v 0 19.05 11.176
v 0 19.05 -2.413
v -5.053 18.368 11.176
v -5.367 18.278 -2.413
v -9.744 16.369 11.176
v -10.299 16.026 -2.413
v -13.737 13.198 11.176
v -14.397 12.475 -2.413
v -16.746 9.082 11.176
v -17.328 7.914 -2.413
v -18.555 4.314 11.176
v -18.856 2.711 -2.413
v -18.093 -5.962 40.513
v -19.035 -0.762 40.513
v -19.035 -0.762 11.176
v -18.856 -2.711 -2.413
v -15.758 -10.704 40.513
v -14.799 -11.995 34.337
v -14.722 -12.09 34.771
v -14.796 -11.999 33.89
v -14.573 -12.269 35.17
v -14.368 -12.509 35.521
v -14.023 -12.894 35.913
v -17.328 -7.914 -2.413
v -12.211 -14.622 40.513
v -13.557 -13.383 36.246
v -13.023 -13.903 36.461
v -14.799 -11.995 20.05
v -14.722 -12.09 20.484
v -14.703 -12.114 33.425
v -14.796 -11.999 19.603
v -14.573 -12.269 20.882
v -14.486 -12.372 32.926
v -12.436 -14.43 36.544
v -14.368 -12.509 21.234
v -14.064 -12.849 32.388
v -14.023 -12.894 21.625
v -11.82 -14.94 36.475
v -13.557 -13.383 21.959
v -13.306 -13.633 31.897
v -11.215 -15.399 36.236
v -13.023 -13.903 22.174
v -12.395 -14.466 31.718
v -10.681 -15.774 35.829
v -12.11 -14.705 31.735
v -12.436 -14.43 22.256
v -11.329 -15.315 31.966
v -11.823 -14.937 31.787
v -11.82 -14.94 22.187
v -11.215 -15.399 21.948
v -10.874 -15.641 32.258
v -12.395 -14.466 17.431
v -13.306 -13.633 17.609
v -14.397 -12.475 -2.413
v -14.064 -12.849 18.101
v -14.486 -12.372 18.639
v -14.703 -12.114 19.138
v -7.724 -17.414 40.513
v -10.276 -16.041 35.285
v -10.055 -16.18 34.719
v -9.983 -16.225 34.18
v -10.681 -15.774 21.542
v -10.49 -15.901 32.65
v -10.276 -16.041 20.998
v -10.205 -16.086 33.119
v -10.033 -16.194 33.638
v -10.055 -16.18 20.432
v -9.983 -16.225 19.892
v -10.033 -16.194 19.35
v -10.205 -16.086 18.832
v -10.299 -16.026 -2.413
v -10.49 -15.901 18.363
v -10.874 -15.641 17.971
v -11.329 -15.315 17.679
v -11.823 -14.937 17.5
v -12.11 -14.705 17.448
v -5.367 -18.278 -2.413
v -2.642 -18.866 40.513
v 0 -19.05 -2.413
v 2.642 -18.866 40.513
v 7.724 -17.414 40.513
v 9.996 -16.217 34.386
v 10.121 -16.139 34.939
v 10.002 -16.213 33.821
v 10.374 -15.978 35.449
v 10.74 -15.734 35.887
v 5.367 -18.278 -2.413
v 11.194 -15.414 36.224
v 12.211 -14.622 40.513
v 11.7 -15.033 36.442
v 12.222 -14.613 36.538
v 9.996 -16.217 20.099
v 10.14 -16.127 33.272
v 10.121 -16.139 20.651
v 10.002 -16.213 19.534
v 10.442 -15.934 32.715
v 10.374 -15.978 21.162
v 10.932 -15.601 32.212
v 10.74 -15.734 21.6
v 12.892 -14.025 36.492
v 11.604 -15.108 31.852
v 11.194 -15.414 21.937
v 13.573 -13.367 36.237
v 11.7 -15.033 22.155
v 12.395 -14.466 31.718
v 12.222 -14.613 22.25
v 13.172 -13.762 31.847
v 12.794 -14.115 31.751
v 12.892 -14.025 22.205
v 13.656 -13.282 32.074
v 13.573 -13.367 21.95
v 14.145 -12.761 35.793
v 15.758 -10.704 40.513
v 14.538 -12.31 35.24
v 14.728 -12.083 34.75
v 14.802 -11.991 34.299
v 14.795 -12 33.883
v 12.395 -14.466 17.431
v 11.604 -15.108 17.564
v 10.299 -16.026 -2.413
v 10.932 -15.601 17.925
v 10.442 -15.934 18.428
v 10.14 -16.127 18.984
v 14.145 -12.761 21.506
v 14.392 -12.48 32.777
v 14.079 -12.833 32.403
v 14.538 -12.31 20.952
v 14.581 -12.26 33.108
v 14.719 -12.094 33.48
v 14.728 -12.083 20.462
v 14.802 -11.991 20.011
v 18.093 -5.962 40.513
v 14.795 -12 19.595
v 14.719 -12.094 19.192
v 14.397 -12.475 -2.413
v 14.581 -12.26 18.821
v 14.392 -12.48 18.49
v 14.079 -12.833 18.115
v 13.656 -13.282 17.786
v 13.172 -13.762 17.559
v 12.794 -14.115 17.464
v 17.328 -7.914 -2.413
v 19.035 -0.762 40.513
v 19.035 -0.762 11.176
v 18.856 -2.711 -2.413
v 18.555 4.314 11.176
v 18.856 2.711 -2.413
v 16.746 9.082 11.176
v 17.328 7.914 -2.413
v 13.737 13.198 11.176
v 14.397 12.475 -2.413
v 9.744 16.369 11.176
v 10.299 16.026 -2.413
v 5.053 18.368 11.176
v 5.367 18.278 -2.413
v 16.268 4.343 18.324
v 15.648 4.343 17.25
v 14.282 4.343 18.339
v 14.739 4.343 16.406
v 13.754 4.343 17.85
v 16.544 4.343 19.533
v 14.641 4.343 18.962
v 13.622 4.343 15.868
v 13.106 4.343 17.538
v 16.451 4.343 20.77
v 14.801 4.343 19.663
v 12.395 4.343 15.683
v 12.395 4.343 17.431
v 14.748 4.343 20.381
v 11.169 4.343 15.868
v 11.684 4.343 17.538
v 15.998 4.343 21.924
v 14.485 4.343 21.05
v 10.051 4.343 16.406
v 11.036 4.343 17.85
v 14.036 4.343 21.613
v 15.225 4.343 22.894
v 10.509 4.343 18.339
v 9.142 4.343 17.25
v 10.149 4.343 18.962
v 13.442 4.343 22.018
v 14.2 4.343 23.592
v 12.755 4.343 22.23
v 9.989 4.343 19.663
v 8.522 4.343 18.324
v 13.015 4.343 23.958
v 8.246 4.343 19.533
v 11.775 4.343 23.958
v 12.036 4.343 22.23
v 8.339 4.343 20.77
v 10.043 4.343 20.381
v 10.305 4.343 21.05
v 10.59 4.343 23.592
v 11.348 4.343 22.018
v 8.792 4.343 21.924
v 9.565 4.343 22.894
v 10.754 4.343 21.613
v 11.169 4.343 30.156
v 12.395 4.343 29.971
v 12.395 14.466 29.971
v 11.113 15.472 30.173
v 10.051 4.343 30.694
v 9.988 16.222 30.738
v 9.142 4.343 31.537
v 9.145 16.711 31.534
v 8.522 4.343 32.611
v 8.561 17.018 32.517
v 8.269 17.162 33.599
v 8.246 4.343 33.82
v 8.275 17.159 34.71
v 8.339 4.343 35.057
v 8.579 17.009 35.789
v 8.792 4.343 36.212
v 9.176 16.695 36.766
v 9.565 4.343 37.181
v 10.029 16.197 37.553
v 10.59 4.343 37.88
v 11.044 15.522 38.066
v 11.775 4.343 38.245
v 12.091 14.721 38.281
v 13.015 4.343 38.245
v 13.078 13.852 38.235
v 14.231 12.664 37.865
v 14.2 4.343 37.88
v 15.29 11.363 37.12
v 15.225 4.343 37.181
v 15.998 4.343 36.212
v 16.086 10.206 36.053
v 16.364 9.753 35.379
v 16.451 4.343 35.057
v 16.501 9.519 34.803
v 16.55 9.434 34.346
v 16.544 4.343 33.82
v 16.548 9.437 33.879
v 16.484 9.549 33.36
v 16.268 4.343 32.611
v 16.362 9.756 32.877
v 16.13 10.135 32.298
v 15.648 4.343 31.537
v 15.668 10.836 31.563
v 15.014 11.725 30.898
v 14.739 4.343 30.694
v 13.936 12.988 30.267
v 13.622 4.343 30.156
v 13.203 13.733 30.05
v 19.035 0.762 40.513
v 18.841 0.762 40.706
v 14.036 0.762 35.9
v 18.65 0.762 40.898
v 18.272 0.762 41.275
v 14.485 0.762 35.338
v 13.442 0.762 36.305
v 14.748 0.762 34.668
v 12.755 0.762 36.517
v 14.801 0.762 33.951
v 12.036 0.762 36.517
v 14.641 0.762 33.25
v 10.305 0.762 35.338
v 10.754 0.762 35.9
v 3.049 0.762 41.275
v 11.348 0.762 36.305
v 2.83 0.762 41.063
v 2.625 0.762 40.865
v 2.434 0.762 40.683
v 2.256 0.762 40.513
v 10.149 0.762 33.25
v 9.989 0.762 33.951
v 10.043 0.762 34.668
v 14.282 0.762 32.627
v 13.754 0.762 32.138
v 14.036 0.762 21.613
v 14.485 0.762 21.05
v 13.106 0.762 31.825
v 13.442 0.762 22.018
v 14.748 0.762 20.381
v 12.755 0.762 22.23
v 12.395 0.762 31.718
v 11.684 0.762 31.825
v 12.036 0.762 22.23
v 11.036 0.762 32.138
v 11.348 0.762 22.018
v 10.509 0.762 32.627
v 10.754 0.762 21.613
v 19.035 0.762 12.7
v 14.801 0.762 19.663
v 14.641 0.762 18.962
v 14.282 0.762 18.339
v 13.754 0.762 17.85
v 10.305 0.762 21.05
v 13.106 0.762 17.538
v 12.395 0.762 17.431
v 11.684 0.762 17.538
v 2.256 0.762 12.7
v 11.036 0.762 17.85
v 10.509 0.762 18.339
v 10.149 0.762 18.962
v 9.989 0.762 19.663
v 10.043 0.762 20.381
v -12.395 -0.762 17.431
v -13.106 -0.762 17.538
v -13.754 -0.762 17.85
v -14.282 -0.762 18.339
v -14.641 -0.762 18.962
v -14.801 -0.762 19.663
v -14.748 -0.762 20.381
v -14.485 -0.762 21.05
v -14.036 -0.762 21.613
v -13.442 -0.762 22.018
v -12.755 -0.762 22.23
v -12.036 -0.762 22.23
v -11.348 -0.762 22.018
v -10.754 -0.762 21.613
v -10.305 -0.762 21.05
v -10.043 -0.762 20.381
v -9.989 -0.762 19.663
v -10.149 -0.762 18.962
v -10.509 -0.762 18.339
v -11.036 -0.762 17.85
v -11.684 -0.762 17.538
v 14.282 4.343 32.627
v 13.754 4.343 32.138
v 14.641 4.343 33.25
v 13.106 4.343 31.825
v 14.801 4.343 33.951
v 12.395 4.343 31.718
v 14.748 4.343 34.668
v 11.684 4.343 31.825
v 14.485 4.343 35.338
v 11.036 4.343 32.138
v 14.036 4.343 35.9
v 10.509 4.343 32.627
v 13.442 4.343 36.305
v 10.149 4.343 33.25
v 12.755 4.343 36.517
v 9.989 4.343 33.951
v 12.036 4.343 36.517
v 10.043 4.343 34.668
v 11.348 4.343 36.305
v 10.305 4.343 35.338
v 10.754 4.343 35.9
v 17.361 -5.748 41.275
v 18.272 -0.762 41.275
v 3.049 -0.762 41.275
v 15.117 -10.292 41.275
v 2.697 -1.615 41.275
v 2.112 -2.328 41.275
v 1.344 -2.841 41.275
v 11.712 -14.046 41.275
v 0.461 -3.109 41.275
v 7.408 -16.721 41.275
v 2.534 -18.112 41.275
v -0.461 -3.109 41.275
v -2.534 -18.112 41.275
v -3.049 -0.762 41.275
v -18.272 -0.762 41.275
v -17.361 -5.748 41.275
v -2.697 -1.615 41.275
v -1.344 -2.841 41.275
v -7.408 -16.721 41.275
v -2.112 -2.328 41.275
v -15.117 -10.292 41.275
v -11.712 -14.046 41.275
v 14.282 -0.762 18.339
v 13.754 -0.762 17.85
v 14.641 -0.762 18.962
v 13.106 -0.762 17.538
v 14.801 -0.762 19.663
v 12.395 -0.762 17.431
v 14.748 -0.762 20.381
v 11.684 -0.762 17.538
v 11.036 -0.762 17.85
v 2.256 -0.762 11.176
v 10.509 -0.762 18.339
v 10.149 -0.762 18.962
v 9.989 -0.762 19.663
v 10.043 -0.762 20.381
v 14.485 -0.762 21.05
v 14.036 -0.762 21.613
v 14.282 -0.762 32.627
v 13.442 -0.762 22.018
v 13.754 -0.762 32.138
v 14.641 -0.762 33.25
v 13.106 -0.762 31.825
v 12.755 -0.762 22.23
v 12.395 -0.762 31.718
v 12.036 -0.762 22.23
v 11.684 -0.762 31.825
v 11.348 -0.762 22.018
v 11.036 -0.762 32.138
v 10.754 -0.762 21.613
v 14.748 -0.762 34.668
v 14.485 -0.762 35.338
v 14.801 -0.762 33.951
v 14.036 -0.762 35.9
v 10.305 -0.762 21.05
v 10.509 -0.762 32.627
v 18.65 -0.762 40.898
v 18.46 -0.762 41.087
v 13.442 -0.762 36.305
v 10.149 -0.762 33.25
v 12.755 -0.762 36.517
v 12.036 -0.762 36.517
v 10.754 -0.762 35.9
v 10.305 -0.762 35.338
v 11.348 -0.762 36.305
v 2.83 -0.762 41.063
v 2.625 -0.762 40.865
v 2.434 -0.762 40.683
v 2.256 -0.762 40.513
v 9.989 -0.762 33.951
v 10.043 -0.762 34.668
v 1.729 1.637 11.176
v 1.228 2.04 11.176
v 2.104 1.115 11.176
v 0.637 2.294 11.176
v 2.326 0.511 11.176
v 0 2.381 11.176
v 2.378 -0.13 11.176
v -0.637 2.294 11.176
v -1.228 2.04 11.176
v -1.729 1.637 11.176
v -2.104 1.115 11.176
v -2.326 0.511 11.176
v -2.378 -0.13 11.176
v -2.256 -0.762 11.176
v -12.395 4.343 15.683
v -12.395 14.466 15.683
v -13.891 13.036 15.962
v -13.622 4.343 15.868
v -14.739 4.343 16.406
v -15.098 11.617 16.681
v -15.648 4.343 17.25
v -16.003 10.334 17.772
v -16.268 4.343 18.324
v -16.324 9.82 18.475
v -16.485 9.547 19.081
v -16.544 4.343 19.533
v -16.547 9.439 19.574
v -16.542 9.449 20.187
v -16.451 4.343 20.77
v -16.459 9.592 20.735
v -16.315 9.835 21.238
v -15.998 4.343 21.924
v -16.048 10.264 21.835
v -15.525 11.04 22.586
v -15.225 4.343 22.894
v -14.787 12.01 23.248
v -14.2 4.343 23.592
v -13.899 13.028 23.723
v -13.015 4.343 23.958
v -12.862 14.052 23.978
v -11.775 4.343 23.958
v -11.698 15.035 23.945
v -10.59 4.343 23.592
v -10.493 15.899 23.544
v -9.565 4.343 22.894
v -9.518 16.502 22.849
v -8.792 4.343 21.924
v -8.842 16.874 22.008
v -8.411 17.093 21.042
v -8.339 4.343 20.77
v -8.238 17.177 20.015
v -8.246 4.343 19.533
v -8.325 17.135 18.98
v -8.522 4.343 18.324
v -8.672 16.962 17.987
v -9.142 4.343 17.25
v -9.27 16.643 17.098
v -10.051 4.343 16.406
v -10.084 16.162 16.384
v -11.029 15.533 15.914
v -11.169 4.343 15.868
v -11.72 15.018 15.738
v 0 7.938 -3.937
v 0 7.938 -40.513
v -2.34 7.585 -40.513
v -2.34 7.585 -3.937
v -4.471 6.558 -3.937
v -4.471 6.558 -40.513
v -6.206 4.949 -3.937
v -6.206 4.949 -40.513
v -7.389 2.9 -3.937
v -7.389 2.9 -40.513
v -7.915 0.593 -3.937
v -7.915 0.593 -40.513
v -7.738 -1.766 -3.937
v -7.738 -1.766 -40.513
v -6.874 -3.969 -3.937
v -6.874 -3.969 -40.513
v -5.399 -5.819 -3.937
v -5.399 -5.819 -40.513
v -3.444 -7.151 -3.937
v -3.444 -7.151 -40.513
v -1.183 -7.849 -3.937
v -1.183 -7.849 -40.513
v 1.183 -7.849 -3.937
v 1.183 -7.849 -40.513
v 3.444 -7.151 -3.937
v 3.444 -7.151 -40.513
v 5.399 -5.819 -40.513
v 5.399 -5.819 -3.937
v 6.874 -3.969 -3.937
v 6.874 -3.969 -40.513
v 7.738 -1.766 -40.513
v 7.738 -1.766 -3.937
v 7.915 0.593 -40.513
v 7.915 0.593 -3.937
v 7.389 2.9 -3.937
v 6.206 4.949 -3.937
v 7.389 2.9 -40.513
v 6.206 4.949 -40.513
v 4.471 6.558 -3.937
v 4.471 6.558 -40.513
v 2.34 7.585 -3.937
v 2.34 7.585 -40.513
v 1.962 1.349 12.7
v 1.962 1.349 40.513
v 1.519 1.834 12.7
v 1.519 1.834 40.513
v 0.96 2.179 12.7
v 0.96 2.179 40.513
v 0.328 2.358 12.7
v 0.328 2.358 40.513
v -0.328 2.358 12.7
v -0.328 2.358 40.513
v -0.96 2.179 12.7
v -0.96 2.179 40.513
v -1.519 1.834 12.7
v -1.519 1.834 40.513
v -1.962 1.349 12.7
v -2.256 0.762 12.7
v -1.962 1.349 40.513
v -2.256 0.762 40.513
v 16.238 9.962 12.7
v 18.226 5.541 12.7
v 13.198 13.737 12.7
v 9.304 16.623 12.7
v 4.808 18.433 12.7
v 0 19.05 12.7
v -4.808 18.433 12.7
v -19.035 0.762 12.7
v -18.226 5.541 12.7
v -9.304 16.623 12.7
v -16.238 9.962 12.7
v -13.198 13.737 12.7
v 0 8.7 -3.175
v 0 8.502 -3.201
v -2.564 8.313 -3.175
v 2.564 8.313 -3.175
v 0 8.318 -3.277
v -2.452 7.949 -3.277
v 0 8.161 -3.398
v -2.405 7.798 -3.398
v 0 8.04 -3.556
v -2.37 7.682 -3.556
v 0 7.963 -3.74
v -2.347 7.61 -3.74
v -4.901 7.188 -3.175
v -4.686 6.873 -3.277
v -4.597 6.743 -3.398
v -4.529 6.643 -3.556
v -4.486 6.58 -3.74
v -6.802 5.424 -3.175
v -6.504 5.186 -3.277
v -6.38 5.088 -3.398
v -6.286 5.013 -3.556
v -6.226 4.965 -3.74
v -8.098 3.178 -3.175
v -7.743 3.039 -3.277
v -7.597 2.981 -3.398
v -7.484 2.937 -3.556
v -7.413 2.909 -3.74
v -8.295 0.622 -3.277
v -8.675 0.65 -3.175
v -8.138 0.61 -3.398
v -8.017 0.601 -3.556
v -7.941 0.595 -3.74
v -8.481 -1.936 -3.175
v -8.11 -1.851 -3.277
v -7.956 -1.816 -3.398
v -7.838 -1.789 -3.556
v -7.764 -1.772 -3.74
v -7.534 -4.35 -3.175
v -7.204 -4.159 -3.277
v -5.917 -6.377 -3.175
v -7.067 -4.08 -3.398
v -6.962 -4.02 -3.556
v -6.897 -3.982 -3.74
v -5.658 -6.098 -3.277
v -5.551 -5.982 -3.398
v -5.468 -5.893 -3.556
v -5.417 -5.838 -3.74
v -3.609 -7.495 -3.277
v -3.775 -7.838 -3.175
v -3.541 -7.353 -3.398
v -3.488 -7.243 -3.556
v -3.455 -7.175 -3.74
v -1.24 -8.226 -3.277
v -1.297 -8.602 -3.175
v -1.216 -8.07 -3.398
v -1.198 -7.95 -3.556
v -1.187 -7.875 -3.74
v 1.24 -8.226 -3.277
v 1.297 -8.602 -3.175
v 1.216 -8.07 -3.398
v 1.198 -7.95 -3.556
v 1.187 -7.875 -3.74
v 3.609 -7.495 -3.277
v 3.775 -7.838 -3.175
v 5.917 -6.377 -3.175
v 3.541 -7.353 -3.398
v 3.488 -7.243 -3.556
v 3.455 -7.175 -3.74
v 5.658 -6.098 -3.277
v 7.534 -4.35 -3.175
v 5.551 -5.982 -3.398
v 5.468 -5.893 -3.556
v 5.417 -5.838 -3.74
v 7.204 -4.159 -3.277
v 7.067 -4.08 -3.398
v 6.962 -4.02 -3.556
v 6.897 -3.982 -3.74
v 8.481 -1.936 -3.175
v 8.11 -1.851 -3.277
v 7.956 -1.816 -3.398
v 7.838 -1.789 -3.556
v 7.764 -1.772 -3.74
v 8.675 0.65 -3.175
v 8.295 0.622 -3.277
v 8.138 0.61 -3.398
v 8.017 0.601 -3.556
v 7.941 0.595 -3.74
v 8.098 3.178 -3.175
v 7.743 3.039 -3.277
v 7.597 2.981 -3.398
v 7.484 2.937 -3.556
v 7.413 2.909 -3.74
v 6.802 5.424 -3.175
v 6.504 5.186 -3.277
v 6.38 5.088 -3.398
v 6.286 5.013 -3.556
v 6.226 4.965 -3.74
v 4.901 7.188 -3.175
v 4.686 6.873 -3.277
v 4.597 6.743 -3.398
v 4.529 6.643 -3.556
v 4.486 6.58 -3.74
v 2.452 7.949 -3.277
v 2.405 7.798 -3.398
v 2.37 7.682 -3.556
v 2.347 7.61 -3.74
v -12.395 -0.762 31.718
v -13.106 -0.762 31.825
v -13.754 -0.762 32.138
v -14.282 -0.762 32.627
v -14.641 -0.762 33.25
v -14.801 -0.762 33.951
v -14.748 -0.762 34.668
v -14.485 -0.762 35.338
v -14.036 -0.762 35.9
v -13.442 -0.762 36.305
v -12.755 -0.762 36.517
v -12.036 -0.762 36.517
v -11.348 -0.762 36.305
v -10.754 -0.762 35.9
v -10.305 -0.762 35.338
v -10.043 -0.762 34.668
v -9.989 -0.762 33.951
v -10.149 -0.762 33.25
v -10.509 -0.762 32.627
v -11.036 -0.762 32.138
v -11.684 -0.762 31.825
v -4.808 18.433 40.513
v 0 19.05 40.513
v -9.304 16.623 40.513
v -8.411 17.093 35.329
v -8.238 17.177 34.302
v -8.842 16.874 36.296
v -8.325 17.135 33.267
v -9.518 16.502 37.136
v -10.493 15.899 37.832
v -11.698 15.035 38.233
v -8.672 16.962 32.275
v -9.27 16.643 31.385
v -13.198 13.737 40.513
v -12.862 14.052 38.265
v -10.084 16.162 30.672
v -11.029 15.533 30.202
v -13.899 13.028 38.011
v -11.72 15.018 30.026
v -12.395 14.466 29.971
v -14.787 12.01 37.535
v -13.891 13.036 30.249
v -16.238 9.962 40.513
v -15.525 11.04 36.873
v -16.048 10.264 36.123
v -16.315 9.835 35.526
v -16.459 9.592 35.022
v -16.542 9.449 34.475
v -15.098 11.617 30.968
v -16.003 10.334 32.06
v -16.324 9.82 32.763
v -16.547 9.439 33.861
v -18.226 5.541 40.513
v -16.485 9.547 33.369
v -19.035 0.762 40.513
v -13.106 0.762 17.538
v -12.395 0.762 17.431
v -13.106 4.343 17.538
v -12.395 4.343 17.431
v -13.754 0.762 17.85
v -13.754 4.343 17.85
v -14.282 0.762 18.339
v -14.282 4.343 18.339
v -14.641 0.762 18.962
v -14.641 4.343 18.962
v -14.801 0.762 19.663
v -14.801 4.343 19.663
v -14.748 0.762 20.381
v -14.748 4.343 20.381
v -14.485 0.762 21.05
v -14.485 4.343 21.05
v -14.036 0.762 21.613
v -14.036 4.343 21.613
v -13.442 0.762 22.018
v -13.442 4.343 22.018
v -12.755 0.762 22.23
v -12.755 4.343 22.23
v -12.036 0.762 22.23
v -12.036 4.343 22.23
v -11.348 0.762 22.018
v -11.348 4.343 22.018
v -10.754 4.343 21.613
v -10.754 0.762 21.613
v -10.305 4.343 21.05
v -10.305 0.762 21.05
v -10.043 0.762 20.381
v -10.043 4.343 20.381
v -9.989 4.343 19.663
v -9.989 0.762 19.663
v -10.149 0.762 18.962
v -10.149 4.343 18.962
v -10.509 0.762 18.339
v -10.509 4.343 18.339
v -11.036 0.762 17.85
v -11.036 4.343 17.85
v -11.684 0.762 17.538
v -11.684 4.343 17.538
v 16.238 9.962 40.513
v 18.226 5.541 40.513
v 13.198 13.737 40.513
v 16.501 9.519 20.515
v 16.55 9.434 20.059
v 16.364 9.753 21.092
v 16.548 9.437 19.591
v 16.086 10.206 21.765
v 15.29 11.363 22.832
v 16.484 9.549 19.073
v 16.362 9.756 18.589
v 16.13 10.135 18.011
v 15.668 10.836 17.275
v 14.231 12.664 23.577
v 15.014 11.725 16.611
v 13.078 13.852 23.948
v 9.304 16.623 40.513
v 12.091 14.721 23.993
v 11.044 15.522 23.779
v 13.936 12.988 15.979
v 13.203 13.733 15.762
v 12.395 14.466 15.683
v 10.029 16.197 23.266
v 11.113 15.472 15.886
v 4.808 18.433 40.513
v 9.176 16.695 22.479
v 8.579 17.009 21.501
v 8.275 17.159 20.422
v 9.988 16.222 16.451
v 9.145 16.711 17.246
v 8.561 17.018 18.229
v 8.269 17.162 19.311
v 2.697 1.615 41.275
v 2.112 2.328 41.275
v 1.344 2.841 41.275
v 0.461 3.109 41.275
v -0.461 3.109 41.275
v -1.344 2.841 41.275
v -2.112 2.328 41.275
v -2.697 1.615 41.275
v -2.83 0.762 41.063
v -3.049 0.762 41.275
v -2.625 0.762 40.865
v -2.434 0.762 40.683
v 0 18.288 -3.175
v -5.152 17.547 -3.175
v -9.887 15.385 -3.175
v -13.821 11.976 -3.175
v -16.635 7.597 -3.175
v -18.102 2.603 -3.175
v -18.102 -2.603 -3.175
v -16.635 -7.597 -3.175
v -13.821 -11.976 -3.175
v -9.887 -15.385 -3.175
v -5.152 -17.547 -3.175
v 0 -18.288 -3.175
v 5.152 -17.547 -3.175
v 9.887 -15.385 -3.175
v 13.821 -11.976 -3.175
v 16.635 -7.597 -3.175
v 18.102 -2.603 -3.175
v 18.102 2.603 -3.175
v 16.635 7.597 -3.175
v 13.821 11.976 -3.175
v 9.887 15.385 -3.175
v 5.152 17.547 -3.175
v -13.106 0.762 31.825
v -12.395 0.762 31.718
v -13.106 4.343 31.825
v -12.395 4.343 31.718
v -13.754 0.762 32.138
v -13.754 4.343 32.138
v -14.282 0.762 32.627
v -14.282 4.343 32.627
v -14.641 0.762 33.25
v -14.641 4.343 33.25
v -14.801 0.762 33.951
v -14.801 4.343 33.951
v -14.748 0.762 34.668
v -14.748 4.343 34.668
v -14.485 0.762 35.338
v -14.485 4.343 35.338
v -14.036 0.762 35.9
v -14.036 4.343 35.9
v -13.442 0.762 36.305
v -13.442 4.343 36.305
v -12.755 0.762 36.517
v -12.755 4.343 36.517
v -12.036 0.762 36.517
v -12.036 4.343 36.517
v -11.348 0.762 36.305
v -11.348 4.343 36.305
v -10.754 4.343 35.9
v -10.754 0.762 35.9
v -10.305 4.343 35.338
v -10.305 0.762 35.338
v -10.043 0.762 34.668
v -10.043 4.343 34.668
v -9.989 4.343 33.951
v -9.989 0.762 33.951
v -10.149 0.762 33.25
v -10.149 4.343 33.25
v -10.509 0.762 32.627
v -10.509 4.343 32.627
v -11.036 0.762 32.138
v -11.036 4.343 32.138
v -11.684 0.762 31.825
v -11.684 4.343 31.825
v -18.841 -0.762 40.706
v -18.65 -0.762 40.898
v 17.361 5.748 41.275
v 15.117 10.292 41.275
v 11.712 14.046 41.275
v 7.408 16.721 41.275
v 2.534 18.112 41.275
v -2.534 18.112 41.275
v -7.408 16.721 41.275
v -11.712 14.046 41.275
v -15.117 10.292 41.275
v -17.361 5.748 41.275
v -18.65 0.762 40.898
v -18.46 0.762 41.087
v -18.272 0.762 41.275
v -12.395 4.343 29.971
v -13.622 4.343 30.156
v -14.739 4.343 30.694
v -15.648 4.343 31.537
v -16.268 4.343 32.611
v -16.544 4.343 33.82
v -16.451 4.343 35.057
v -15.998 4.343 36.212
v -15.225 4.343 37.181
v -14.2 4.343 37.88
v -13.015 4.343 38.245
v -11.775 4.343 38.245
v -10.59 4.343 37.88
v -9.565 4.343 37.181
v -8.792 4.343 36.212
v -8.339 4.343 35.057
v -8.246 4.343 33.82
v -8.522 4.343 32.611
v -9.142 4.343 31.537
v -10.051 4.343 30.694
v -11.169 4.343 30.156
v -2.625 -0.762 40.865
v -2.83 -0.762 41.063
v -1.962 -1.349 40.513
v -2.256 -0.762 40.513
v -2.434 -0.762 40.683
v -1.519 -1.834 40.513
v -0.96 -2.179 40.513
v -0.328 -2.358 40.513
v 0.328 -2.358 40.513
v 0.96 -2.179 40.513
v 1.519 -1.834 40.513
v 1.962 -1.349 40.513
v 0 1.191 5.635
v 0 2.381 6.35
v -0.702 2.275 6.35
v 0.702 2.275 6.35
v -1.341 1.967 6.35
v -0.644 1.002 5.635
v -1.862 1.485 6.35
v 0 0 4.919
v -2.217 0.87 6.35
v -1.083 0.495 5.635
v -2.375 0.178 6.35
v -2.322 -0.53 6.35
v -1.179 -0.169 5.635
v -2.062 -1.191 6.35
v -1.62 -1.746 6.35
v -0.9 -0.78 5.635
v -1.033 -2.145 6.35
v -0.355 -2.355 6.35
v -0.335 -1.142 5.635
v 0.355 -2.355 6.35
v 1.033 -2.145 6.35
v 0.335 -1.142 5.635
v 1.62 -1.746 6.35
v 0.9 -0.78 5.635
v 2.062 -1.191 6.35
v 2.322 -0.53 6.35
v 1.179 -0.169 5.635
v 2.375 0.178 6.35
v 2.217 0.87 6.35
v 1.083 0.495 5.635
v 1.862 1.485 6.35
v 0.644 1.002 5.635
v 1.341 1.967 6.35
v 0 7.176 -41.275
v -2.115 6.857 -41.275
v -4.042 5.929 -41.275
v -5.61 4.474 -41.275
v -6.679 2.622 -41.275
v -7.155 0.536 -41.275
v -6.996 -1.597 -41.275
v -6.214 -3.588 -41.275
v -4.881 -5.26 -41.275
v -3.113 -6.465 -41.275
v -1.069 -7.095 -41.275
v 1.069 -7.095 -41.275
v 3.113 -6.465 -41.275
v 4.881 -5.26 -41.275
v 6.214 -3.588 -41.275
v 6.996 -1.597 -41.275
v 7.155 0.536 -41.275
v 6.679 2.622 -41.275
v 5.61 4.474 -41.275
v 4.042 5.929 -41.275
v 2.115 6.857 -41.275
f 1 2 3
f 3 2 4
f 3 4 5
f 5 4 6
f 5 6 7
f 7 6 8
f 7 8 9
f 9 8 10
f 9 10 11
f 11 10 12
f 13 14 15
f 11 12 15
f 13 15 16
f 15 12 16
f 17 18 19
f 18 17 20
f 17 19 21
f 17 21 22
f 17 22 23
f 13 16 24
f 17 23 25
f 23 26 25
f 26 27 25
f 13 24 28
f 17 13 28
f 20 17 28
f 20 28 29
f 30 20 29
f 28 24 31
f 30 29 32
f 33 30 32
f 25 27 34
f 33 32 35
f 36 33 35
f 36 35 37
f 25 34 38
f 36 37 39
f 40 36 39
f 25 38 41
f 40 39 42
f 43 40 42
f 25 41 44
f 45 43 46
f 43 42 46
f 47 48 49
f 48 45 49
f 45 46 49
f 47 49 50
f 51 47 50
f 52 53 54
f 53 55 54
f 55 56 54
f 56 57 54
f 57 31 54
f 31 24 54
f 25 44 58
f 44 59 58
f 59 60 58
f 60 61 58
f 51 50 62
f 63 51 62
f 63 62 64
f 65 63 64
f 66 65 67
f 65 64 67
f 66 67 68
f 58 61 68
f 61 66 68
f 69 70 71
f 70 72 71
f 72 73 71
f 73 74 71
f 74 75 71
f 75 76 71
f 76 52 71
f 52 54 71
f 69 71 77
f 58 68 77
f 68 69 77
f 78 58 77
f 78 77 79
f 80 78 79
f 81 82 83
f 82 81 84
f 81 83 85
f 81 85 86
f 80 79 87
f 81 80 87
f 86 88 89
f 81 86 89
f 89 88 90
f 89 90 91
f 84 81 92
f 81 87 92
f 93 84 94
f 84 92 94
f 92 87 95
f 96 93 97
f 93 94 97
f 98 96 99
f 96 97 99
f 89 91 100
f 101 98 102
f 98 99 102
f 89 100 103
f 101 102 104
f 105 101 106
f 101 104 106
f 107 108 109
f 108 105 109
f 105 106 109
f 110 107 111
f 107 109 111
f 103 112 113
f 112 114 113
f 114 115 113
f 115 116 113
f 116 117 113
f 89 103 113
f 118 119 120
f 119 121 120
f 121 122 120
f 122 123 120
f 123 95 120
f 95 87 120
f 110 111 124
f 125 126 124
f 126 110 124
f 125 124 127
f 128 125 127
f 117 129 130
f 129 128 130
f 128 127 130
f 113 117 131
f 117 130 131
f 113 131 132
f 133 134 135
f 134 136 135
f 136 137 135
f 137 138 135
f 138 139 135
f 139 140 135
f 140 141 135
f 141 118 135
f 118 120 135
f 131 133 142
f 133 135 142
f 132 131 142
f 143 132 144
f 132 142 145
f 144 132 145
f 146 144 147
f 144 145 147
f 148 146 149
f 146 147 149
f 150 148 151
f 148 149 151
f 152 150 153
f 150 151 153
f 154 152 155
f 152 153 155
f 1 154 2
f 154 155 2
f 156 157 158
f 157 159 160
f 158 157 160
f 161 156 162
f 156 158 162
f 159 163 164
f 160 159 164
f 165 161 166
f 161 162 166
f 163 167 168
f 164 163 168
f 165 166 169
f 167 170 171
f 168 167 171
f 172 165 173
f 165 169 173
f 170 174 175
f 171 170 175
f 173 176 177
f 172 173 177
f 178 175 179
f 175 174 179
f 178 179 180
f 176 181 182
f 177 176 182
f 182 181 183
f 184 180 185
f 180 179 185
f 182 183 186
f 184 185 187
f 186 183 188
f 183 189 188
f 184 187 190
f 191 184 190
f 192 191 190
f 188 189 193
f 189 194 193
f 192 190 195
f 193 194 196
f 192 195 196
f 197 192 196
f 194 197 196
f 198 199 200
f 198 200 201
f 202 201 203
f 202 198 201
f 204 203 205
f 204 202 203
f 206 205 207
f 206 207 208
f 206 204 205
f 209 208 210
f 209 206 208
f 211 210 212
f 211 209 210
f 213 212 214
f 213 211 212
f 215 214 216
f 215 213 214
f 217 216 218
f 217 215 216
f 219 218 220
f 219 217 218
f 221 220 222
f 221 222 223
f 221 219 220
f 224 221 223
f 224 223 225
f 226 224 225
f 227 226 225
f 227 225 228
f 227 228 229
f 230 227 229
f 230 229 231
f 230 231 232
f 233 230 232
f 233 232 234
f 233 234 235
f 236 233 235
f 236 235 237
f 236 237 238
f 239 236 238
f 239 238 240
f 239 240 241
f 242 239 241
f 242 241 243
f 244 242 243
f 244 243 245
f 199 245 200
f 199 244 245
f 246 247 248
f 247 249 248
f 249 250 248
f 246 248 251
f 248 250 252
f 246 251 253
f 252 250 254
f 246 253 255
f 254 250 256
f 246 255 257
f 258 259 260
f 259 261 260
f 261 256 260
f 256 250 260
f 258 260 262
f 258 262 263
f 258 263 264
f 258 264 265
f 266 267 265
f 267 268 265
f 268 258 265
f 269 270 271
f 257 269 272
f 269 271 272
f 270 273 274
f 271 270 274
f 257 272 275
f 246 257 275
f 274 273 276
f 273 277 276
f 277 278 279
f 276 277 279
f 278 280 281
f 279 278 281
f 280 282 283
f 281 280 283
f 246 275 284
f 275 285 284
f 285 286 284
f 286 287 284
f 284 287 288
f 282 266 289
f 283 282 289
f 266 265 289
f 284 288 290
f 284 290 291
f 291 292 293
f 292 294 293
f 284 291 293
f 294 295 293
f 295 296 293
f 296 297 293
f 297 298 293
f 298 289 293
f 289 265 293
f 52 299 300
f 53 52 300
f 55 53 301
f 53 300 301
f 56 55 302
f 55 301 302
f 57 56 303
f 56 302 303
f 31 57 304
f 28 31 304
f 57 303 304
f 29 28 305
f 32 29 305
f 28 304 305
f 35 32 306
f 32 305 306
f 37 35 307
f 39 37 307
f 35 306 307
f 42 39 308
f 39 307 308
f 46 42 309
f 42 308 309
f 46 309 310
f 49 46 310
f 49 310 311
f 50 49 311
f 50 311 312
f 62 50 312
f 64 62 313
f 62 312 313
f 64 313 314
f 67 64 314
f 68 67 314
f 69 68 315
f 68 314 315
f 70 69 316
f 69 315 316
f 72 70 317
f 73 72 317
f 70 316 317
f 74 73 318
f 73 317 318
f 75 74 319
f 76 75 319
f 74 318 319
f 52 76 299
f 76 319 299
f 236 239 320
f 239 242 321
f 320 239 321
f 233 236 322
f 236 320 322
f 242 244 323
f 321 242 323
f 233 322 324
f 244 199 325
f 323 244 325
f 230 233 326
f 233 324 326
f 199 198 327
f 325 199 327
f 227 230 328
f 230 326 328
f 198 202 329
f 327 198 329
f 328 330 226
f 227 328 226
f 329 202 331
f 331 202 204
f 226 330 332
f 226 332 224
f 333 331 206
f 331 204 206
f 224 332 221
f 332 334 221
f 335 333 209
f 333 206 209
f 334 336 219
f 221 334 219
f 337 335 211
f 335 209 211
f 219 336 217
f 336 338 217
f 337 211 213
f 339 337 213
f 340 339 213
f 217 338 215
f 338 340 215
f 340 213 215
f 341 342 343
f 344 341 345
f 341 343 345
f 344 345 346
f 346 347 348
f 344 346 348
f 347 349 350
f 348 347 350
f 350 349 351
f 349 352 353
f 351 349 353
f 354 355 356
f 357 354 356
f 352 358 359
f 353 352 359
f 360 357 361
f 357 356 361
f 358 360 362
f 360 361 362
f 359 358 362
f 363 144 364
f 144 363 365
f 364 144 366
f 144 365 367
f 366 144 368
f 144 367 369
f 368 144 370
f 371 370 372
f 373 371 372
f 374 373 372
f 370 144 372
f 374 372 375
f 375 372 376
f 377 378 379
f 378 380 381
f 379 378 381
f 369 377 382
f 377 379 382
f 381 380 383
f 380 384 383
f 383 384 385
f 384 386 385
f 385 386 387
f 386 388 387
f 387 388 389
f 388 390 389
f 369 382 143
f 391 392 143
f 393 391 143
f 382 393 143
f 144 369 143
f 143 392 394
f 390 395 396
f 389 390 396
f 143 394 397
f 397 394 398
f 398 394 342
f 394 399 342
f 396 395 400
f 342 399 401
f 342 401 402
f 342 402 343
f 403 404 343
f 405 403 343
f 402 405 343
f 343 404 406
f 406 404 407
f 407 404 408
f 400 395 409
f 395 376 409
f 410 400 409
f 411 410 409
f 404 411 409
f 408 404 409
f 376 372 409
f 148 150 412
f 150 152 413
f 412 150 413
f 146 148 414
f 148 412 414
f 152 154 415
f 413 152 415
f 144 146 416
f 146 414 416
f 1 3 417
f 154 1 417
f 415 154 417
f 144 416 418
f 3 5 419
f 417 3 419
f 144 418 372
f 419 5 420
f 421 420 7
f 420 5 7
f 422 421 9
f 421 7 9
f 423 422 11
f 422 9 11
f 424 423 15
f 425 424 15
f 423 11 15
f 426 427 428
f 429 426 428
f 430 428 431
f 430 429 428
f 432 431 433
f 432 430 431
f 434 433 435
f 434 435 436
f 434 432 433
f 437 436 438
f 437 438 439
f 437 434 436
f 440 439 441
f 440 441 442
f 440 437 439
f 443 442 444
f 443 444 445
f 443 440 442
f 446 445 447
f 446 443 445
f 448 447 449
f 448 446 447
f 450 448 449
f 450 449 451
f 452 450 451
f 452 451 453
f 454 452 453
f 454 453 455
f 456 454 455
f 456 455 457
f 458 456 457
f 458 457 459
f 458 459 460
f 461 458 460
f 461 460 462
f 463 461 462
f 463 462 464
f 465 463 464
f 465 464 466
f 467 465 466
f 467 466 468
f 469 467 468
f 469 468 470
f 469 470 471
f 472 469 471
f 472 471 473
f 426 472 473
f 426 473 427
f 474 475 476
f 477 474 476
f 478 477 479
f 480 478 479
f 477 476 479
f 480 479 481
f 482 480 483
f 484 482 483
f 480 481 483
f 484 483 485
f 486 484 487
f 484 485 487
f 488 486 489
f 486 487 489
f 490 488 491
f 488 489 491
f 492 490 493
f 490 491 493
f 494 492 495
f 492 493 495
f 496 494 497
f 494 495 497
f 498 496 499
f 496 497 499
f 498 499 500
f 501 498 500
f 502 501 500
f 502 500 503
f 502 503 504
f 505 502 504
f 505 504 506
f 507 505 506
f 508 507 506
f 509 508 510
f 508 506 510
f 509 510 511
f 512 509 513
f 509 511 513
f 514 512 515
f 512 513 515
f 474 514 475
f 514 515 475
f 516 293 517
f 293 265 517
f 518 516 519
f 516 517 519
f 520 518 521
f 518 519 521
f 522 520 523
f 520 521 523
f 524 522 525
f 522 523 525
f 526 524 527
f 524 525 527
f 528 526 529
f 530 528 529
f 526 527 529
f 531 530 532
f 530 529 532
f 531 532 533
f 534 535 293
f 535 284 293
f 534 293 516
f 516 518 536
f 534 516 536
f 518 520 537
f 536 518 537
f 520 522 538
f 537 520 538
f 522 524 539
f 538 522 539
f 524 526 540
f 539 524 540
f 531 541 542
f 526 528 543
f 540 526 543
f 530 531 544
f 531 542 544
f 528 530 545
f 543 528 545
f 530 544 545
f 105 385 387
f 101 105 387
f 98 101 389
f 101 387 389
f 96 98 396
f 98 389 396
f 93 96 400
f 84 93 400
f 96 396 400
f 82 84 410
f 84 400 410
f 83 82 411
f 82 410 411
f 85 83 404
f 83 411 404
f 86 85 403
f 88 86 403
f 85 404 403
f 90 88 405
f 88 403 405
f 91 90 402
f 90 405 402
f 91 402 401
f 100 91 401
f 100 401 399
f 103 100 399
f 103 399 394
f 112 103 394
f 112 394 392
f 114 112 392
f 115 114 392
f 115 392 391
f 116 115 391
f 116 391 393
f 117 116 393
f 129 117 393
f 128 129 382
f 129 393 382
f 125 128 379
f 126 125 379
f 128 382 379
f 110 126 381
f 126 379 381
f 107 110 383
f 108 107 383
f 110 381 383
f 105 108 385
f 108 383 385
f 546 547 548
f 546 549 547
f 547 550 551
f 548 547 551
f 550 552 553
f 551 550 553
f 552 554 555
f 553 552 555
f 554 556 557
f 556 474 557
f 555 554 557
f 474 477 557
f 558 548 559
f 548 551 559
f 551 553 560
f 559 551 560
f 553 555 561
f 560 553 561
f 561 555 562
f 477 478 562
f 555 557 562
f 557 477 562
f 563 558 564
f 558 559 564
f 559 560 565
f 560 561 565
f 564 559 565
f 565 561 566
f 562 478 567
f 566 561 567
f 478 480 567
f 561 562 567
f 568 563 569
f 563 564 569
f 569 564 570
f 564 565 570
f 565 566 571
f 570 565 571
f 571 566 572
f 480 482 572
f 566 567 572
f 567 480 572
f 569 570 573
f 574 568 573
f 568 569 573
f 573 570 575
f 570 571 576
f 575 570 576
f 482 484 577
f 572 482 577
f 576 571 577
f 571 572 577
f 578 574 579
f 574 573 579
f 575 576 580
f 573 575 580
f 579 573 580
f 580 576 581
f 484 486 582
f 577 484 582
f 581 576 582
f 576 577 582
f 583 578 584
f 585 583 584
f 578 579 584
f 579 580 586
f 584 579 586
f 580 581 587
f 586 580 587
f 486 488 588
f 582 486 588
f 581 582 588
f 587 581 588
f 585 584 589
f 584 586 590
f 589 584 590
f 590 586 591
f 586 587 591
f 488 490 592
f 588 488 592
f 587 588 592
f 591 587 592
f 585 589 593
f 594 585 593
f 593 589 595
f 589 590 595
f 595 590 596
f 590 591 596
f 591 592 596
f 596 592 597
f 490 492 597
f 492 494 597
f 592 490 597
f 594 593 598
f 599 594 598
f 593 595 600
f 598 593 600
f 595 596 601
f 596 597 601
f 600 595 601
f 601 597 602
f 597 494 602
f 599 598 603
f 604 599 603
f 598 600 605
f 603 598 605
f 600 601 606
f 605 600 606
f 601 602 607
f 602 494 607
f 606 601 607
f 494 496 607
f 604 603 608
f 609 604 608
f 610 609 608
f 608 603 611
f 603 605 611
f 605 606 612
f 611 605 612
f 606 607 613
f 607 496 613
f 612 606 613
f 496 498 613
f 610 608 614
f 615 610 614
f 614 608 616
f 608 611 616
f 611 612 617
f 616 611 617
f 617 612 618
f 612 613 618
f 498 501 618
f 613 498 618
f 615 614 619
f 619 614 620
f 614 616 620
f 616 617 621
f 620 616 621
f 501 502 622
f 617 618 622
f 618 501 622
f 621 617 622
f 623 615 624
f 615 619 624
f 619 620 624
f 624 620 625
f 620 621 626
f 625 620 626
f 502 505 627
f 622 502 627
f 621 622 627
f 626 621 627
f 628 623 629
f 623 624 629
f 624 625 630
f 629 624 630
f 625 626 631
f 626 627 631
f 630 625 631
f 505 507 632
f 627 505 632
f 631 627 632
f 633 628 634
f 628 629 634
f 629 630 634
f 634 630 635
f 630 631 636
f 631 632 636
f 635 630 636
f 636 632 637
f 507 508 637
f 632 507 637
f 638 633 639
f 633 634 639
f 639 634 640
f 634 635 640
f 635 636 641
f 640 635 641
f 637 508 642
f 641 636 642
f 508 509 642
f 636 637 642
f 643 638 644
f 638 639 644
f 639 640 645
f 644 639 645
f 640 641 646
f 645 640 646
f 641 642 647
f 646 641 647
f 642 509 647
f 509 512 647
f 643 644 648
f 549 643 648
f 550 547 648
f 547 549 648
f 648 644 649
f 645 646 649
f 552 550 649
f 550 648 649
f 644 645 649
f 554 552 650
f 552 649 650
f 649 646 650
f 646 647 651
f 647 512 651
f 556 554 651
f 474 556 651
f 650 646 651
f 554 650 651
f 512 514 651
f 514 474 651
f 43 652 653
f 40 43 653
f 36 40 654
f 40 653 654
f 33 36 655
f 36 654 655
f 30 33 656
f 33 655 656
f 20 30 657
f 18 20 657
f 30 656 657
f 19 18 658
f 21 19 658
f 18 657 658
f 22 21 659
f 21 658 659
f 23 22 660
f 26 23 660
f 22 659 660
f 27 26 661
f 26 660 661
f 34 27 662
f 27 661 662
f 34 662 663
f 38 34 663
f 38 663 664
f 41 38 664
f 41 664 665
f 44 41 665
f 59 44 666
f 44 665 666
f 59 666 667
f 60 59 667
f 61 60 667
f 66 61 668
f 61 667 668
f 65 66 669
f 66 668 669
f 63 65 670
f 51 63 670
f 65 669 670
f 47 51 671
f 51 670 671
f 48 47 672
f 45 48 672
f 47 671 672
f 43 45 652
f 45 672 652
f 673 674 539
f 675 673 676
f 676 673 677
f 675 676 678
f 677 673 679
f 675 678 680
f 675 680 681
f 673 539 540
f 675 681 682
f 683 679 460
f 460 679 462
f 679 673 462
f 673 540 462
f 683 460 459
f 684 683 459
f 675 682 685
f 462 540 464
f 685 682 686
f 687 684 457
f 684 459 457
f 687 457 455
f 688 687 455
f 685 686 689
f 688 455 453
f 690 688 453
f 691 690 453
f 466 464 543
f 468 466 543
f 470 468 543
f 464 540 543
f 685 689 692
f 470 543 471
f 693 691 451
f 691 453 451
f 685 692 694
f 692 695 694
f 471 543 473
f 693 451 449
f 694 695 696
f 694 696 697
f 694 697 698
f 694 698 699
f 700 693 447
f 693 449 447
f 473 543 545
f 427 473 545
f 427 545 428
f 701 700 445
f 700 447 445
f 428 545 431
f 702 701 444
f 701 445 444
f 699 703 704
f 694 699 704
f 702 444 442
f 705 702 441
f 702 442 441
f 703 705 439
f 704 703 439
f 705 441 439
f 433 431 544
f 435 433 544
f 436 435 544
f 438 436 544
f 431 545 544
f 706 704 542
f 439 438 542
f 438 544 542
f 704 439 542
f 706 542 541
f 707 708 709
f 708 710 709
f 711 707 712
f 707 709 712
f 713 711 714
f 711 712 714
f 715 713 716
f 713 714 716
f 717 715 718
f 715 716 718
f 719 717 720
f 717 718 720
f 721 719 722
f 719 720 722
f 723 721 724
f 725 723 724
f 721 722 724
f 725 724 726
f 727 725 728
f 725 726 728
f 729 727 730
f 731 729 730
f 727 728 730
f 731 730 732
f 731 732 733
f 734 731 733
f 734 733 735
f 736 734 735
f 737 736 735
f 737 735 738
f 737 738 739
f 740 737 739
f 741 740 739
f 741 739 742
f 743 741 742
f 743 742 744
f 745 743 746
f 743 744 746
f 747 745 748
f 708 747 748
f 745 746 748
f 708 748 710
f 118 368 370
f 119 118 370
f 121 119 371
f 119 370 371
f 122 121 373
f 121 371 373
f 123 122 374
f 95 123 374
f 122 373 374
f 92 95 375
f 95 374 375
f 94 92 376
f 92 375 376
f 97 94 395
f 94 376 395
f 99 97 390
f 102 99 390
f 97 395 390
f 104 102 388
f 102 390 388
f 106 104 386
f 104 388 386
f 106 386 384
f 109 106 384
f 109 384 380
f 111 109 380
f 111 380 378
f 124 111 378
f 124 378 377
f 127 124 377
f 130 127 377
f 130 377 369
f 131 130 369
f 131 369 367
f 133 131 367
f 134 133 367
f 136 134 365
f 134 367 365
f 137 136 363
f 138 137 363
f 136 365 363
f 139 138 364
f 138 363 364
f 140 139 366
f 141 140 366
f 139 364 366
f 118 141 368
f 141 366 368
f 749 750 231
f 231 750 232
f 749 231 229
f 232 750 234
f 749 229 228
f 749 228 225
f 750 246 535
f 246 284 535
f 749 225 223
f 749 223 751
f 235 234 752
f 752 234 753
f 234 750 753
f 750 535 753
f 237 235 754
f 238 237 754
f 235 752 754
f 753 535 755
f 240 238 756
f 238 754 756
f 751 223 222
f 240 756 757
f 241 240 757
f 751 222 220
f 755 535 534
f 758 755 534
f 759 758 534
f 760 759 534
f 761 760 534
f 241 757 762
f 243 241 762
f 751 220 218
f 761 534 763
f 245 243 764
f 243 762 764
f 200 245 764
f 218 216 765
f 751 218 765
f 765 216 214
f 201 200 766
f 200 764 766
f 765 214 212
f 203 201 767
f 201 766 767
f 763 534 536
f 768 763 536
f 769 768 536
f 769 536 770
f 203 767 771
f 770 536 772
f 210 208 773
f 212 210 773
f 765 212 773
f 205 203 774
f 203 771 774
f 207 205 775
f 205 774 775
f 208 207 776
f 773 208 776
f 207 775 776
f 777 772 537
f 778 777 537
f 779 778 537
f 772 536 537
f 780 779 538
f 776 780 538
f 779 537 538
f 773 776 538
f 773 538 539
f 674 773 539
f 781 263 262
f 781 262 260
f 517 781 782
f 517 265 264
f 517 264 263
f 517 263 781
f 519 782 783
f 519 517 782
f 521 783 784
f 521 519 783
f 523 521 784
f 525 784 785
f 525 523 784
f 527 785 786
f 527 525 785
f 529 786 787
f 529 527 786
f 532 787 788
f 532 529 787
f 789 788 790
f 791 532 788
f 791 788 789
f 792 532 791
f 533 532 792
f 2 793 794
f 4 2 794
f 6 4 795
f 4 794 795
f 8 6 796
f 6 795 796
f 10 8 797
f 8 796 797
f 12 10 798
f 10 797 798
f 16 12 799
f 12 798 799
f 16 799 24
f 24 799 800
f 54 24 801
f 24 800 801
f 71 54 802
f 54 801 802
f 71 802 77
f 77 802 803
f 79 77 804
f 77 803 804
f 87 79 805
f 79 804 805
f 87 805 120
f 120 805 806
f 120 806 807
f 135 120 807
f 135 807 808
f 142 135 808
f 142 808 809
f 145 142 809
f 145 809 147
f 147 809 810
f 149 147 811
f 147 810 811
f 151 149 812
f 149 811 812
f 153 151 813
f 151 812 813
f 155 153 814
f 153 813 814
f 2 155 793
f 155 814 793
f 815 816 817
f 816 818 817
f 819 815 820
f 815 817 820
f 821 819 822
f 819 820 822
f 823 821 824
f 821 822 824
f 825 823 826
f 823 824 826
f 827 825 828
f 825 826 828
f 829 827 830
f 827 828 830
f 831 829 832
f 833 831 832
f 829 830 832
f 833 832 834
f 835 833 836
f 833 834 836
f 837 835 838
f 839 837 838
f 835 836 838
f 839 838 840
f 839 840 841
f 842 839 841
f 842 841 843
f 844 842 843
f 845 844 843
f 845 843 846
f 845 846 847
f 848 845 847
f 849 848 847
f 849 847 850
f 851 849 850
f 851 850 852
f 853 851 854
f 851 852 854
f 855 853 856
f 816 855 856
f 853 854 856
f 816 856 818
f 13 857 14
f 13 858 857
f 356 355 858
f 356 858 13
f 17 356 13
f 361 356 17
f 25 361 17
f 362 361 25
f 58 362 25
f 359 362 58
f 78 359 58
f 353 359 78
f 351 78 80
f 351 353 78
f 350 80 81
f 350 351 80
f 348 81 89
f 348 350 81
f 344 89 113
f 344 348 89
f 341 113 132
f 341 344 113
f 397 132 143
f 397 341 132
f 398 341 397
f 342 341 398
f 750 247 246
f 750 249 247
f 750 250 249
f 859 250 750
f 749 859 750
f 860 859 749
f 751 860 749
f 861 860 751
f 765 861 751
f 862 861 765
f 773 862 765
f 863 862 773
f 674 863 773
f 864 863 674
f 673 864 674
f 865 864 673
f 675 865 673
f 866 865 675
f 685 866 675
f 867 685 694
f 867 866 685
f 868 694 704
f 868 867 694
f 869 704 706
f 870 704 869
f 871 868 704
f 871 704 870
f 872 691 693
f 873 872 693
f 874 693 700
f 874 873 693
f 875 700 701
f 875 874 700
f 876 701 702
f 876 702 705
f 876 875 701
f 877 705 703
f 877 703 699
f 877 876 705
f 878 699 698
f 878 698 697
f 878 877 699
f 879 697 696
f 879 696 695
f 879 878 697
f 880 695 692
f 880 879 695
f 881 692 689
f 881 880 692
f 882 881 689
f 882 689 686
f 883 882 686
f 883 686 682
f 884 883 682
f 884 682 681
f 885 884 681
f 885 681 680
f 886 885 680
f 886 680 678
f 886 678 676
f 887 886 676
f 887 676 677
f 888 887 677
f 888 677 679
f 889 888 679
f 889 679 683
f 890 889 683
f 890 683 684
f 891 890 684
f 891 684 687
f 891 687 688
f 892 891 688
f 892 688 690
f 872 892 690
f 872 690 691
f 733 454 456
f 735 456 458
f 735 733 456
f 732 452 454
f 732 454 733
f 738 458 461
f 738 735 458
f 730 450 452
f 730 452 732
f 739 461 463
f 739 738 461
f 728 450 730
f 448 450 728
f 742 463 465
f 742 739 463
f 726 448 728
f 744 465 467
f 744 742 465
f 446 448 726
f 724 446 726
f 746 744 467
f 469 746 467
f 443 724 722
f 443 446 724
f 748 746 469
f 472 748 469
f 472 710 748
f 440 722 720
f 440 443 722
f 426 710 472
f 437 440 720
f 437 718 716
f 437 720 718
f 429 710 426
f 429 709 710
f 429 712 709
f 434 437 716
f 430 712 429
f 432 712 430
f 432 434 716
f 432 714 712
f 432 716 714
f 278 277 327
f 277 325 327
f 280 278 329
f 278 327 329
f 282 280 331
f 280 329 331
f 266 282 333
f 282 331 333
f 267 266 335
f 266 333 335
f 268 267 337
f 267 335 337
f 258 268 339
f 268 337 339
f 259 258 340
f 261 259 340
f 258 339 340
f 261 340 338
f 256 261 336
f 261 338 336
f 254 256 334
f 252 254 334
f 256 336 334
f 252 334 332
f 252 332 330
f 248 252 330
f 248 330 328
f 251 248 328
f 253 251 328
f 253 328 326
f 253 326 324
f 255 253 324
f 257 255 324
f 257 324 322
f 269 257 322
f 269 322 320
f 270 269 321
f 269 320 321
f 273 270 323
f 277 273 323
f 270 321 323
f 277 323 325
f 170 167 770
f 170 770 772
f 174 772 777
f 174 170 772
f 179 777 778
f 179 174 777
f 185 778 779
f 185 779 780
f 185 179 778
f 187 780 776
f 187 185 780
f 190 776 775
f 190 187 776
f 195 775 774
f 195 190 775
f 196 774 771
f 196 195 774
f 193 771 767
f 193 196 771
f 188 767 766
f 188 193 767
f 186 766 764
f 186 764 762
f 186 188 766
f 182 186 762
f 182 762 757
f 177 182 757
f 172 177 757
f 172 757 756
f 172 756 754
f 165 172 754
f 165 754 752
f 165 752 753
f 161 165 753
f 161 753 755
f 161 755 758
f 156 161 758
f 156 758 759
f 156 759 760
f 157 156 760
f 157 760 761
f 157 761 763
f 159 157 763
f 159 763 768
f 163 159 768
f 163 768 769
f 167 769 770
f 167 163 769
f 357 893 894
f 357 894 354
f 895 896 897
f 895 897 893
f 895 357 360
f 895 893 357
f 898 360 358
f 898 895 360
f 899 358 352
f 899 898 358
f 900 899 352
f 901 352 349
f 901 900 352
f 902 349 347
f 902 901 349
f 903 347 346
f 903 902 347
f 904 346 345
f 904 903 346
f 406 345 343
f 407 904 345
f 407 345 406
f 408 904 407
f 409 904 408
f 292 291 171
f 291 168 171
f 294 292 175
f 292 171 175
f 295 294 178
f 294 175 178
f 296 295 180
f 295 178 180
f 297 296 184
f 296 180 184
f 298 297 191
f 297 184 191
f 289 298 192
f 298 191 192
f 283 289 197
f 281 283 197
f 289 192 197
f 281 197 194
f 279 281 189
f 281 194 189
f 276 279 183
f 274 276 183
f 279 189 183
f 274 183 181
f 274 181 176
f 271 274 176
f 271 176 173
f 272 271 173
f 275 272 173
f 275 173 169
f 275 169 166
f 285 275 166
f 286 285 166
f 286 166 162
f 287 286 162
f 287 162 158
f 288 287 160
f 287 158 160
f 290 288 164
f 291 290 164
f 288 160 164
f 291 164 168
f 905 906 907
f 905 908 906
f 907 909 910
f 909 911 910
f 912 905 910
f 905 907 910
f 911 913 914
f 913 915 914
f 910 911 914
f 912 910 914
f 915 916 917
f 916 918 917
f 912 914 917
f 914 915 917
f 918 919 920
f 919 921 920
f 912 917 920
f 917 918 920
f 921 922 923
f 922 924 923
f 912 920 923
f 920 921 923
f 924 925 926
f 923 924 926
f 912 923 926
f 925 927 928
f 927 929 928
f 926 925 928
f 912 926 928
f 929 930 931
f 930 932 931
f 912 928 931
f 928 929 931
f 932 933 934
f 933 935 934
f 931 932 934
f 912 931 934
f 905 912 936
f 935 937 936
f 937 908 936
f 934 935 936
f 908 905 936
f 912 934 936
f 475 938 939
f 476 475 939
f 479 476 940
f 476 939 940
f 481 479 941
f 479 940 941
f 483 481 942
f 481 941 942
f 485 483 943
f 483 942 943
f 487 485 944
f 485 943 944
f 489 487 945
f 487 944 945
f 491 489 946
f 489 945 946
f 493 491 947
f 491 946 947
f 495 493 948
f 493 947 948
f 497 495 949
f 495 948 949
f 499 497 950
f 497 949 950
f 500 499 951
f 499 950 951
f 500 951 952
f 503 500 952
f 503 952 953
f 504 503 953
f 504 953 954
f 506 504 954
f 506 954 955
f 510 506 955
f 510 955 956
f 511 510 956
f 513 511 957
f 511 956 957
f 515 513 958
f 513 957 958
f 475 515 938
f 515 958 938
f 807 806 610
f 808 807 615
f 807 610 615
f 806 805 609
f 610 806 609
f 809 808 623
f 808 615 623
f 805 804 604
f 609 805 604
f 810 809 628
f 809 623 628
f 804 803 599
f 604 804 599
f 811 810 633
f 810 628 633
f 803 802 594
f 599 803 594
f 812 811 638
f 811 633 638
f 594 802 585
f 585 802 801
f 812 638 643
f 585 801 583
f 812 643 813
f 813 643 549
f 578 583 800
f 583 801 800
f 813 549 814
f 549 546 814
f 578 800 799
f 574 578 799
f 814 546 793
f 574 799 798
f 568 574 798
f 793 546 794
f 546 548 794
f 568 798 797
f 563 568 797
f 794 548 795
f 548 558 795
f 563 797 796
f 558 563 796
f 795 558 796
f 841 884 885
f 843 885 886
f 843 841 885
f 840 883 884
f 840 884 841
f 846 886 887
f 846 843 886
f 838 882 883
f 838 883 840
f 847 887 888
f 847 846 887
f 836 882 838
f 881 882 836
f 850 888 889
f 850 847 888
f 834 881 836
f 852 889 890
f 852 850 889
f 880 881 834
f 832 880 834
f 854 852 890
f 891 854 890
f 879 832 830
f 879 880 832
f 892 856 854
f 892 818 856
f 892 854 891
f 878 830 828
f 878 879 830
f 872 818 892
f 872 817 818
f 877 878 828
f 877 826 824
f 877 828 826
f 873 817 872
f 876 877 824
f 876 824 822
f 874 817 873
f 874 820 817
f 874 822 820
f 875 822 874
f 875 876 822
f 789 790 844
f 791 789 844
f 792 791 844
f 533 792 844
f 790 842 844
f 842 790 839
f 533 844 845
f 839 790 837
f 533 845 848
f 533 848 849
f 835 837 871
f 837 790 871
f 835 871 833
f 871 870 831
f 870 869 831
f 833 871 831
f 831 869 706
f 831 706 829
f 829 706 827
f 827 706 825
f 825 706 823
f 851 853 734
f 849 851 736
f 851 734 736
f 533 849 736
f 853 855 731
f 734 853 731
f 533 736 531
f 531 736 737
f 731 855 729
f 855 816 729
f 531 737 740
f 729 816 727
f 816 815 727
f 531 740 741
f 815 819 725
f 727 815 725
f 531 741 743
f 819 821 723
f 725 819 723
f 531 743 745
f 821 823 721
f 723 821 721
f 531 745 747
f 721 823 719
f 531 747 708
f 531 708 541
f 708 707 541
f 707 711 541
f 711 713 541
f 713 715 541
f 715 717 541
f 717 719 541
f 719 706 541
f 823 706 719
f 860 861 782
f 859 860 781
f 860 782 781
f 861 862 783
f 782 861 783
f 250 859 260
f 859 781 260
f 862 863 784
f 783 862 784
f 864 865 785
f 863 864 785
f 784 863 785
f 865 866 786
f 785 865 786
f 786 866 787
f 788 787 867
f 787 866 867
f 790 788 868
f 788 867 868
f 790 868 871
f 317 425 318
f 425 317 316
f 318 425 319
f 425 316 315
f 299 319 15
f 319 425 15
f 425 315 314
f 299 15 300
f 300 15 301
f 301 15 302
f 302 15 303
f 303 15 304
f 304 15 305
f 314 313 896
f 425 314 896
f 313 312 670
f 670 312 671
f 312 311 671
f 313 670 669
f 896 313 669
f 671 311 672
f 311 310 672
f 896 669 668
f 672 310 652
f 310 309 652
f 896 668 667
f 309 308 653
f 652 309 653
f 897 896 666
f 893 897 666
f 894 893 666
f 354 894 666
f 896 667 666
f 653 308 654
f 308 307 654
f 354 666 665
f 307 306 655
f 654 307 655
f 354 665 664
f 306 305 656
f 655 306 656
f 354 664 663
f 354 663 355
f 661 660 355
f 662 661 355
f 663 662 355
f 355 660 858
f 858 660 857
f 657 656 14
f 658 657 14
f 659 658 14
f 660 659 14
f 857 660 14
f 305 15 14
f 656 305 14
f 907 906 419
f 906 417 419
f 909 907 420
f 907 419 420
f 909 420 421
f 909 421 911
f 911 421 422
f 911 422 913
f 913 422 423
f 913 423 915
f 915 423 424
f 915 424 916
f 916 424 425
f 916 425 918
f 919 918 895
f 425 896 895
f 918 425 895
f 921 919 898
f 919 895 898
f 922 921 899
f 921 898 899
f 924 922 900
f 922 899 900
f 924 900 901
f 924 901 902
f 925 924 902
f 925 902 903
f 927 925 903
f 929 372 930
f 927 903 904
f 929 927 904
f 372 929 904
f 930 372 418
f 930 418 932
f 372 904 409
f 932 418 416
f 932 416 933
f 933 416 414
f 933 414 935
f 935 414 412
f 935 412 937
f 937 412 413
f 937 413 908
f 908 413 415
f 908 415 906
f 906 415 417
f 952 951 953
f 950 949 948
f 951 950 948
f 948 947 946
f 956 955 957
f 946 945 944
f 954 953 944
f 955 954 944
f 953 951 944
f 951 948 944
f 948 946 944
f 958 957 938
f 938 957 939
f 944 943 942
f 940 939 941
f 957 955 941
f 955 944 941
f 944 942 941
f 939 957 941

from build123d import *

# Parameters (mm, degrees)
SKETCH11_R              = 4.16052
CUT_EXTRUDE4_DEPTH      = 52.125133793
LPATTERN1_COUNT         = 2
LPATTERN1_PITCH         = 14.2875
LPATTERN1_COUNT_DIR2    = 2
LPATTERN1_PITCH_DIR2    = 24.7904
CHAMFER1_SIZE           = 0.762
FILLET1_R               = 0.762
CUT_EXTRUDE6_DEPTH      = 50.289254738
CUT_EXTRUDE6_DEPTH_BACK = 50.289254738


with BuildPart() as part:
    # Sketch1 → Revolve1 (revolve)
    with BuildSketch(Plane(origin=(0, 0, 0), x_dir=(0, 0, -1), z_dir=(1, 0, 0))):
        Polygon((-41.275, 19.05), (3.175, 19.05), (3.175, 7.9375), (41.275, 7.9375), (41.275, 0), (-4.919200651, 0), (-6.35, 2.38125), (-41.275, 2.38125), align=None)
    revolve(axis=Axis((0, 0, -41.275), (0, 0, 1)))

    # Sketch4 → Cut-Revolve1 (revolve, cut)
    with BuildSketch(Plane.XY.offset(34.13125), mode=Mode.PRIVATE) as cut_revolve1_sk:
        Polygon((14.8082, 4.3434), (16.3576, 4.3434), (16.3576, 9.1694), (16.3576, 19.05), (12.3952, 19.05), (12.3952, -19.05), (14.8082, -19.05), align=None)
    cut_revolve1 = revolve(cut_revolve1_sk.sketch.rotate(Axis((12.3952, -19.05, 34.13125), (0, 1, 0)), 90), axis=Axis((12.3952, -19.05, 34.13125), (0, 1, 0)), mode=Mode.SUBTRACT)

    # Sketch11 → Cut-Extrude4 (cut, through all)
    with BuildSketch(Plane(origin=(0, 4.3434, 0), x_dir=(1, 0, 0), z_dir=(0, 1, 0))):
        with Locations(Location((12.3952, -34.13125, 0), (0, 0, 90))):
            Circle(SKETCH11_R)
    cut_extrude4 = extrude(amount=CUT_EXTRUDE4_DEPTH, mode=Mode.SUBTRACT)

    # LPattern1: Cut-Revolve1, Cut-Extrude4 2 × 2
    with Locations(*[(-j * LPATTERN1_PITCH_DIR2, 0, -i * LPATTERN1_PITCH) for i in range(LPATTERN1_COUNT) for j in range(LPATTERN1_COUNT_DIR2) if (i, j) != (0, 0)]):
        add(cut_revolve1, mode=Mode.SUBTRACT)
        add(cut_extrude4, mode=Mode.SUBTRACT)

    # Chamfer1
    chamfer1_edges = [part.edges().sort_by_distance(p)[0] for p in [
        (0, -2.38125, 41.275),
        (0, -7.9375, -41.275),
        (0, -19.05, -3.175),
        (0, -19.05, 41.275),
    ]]
    chamfer(chamfer1_edges, length=CHAMFER1_SIZE)

    # Fillet1
    fillet1_edges = [part.edges().sort_by_distance(p)[0] for p in [
        (0, -7.9375, -3.175),
    ]]
    fillet(fillet1_edges, radius=FILLET1_R)

    # Sketch14 → Cut-Extrude6 (cut, two sides: drawn at the far end of the back side and taken through both)
    with BuildSketch(Plane(origin=(0, 0, 0), x_dir=(0, 0, -1), z_dir=(1, 0, 0)).offset(-CUT_EXTRUDE6_DEPTH_BACK)):
        Polygon((-41.275, 0.762), (-12.7, 0.762), (-12.7, 19.05), (-11.176, 19.05), (-11.176, -0.762), (-41.275, -0.762), align=None)
    extrude(amount=CUT_EXTRUDE6_DEPTH + CUT_EXTRUDE6_DEPTH_BACK, mode=Mode.SUBTRACT)


with BuildPart() as cut_extrude6_piece_1:
    # of the separate pieces the step leaves, piece 1, a body of its own (cut_extrude6_pieces)
    add(part.part.solids().sort_by_distance((0, 8.6995, -3.175))[0])


with BuildPart() as cut_extrude6_piece_2:
    # of the separate pieces the step leaves, piece 2, a body of its own (cut_extrude6_pieces)
    add(part.part.solids().sort_by_distance((19.034753899, 0.762, 40.513))[0])


solid = Compound([cut_extrude6_piece_1.part, cut_extrude6_piece_2.part])
